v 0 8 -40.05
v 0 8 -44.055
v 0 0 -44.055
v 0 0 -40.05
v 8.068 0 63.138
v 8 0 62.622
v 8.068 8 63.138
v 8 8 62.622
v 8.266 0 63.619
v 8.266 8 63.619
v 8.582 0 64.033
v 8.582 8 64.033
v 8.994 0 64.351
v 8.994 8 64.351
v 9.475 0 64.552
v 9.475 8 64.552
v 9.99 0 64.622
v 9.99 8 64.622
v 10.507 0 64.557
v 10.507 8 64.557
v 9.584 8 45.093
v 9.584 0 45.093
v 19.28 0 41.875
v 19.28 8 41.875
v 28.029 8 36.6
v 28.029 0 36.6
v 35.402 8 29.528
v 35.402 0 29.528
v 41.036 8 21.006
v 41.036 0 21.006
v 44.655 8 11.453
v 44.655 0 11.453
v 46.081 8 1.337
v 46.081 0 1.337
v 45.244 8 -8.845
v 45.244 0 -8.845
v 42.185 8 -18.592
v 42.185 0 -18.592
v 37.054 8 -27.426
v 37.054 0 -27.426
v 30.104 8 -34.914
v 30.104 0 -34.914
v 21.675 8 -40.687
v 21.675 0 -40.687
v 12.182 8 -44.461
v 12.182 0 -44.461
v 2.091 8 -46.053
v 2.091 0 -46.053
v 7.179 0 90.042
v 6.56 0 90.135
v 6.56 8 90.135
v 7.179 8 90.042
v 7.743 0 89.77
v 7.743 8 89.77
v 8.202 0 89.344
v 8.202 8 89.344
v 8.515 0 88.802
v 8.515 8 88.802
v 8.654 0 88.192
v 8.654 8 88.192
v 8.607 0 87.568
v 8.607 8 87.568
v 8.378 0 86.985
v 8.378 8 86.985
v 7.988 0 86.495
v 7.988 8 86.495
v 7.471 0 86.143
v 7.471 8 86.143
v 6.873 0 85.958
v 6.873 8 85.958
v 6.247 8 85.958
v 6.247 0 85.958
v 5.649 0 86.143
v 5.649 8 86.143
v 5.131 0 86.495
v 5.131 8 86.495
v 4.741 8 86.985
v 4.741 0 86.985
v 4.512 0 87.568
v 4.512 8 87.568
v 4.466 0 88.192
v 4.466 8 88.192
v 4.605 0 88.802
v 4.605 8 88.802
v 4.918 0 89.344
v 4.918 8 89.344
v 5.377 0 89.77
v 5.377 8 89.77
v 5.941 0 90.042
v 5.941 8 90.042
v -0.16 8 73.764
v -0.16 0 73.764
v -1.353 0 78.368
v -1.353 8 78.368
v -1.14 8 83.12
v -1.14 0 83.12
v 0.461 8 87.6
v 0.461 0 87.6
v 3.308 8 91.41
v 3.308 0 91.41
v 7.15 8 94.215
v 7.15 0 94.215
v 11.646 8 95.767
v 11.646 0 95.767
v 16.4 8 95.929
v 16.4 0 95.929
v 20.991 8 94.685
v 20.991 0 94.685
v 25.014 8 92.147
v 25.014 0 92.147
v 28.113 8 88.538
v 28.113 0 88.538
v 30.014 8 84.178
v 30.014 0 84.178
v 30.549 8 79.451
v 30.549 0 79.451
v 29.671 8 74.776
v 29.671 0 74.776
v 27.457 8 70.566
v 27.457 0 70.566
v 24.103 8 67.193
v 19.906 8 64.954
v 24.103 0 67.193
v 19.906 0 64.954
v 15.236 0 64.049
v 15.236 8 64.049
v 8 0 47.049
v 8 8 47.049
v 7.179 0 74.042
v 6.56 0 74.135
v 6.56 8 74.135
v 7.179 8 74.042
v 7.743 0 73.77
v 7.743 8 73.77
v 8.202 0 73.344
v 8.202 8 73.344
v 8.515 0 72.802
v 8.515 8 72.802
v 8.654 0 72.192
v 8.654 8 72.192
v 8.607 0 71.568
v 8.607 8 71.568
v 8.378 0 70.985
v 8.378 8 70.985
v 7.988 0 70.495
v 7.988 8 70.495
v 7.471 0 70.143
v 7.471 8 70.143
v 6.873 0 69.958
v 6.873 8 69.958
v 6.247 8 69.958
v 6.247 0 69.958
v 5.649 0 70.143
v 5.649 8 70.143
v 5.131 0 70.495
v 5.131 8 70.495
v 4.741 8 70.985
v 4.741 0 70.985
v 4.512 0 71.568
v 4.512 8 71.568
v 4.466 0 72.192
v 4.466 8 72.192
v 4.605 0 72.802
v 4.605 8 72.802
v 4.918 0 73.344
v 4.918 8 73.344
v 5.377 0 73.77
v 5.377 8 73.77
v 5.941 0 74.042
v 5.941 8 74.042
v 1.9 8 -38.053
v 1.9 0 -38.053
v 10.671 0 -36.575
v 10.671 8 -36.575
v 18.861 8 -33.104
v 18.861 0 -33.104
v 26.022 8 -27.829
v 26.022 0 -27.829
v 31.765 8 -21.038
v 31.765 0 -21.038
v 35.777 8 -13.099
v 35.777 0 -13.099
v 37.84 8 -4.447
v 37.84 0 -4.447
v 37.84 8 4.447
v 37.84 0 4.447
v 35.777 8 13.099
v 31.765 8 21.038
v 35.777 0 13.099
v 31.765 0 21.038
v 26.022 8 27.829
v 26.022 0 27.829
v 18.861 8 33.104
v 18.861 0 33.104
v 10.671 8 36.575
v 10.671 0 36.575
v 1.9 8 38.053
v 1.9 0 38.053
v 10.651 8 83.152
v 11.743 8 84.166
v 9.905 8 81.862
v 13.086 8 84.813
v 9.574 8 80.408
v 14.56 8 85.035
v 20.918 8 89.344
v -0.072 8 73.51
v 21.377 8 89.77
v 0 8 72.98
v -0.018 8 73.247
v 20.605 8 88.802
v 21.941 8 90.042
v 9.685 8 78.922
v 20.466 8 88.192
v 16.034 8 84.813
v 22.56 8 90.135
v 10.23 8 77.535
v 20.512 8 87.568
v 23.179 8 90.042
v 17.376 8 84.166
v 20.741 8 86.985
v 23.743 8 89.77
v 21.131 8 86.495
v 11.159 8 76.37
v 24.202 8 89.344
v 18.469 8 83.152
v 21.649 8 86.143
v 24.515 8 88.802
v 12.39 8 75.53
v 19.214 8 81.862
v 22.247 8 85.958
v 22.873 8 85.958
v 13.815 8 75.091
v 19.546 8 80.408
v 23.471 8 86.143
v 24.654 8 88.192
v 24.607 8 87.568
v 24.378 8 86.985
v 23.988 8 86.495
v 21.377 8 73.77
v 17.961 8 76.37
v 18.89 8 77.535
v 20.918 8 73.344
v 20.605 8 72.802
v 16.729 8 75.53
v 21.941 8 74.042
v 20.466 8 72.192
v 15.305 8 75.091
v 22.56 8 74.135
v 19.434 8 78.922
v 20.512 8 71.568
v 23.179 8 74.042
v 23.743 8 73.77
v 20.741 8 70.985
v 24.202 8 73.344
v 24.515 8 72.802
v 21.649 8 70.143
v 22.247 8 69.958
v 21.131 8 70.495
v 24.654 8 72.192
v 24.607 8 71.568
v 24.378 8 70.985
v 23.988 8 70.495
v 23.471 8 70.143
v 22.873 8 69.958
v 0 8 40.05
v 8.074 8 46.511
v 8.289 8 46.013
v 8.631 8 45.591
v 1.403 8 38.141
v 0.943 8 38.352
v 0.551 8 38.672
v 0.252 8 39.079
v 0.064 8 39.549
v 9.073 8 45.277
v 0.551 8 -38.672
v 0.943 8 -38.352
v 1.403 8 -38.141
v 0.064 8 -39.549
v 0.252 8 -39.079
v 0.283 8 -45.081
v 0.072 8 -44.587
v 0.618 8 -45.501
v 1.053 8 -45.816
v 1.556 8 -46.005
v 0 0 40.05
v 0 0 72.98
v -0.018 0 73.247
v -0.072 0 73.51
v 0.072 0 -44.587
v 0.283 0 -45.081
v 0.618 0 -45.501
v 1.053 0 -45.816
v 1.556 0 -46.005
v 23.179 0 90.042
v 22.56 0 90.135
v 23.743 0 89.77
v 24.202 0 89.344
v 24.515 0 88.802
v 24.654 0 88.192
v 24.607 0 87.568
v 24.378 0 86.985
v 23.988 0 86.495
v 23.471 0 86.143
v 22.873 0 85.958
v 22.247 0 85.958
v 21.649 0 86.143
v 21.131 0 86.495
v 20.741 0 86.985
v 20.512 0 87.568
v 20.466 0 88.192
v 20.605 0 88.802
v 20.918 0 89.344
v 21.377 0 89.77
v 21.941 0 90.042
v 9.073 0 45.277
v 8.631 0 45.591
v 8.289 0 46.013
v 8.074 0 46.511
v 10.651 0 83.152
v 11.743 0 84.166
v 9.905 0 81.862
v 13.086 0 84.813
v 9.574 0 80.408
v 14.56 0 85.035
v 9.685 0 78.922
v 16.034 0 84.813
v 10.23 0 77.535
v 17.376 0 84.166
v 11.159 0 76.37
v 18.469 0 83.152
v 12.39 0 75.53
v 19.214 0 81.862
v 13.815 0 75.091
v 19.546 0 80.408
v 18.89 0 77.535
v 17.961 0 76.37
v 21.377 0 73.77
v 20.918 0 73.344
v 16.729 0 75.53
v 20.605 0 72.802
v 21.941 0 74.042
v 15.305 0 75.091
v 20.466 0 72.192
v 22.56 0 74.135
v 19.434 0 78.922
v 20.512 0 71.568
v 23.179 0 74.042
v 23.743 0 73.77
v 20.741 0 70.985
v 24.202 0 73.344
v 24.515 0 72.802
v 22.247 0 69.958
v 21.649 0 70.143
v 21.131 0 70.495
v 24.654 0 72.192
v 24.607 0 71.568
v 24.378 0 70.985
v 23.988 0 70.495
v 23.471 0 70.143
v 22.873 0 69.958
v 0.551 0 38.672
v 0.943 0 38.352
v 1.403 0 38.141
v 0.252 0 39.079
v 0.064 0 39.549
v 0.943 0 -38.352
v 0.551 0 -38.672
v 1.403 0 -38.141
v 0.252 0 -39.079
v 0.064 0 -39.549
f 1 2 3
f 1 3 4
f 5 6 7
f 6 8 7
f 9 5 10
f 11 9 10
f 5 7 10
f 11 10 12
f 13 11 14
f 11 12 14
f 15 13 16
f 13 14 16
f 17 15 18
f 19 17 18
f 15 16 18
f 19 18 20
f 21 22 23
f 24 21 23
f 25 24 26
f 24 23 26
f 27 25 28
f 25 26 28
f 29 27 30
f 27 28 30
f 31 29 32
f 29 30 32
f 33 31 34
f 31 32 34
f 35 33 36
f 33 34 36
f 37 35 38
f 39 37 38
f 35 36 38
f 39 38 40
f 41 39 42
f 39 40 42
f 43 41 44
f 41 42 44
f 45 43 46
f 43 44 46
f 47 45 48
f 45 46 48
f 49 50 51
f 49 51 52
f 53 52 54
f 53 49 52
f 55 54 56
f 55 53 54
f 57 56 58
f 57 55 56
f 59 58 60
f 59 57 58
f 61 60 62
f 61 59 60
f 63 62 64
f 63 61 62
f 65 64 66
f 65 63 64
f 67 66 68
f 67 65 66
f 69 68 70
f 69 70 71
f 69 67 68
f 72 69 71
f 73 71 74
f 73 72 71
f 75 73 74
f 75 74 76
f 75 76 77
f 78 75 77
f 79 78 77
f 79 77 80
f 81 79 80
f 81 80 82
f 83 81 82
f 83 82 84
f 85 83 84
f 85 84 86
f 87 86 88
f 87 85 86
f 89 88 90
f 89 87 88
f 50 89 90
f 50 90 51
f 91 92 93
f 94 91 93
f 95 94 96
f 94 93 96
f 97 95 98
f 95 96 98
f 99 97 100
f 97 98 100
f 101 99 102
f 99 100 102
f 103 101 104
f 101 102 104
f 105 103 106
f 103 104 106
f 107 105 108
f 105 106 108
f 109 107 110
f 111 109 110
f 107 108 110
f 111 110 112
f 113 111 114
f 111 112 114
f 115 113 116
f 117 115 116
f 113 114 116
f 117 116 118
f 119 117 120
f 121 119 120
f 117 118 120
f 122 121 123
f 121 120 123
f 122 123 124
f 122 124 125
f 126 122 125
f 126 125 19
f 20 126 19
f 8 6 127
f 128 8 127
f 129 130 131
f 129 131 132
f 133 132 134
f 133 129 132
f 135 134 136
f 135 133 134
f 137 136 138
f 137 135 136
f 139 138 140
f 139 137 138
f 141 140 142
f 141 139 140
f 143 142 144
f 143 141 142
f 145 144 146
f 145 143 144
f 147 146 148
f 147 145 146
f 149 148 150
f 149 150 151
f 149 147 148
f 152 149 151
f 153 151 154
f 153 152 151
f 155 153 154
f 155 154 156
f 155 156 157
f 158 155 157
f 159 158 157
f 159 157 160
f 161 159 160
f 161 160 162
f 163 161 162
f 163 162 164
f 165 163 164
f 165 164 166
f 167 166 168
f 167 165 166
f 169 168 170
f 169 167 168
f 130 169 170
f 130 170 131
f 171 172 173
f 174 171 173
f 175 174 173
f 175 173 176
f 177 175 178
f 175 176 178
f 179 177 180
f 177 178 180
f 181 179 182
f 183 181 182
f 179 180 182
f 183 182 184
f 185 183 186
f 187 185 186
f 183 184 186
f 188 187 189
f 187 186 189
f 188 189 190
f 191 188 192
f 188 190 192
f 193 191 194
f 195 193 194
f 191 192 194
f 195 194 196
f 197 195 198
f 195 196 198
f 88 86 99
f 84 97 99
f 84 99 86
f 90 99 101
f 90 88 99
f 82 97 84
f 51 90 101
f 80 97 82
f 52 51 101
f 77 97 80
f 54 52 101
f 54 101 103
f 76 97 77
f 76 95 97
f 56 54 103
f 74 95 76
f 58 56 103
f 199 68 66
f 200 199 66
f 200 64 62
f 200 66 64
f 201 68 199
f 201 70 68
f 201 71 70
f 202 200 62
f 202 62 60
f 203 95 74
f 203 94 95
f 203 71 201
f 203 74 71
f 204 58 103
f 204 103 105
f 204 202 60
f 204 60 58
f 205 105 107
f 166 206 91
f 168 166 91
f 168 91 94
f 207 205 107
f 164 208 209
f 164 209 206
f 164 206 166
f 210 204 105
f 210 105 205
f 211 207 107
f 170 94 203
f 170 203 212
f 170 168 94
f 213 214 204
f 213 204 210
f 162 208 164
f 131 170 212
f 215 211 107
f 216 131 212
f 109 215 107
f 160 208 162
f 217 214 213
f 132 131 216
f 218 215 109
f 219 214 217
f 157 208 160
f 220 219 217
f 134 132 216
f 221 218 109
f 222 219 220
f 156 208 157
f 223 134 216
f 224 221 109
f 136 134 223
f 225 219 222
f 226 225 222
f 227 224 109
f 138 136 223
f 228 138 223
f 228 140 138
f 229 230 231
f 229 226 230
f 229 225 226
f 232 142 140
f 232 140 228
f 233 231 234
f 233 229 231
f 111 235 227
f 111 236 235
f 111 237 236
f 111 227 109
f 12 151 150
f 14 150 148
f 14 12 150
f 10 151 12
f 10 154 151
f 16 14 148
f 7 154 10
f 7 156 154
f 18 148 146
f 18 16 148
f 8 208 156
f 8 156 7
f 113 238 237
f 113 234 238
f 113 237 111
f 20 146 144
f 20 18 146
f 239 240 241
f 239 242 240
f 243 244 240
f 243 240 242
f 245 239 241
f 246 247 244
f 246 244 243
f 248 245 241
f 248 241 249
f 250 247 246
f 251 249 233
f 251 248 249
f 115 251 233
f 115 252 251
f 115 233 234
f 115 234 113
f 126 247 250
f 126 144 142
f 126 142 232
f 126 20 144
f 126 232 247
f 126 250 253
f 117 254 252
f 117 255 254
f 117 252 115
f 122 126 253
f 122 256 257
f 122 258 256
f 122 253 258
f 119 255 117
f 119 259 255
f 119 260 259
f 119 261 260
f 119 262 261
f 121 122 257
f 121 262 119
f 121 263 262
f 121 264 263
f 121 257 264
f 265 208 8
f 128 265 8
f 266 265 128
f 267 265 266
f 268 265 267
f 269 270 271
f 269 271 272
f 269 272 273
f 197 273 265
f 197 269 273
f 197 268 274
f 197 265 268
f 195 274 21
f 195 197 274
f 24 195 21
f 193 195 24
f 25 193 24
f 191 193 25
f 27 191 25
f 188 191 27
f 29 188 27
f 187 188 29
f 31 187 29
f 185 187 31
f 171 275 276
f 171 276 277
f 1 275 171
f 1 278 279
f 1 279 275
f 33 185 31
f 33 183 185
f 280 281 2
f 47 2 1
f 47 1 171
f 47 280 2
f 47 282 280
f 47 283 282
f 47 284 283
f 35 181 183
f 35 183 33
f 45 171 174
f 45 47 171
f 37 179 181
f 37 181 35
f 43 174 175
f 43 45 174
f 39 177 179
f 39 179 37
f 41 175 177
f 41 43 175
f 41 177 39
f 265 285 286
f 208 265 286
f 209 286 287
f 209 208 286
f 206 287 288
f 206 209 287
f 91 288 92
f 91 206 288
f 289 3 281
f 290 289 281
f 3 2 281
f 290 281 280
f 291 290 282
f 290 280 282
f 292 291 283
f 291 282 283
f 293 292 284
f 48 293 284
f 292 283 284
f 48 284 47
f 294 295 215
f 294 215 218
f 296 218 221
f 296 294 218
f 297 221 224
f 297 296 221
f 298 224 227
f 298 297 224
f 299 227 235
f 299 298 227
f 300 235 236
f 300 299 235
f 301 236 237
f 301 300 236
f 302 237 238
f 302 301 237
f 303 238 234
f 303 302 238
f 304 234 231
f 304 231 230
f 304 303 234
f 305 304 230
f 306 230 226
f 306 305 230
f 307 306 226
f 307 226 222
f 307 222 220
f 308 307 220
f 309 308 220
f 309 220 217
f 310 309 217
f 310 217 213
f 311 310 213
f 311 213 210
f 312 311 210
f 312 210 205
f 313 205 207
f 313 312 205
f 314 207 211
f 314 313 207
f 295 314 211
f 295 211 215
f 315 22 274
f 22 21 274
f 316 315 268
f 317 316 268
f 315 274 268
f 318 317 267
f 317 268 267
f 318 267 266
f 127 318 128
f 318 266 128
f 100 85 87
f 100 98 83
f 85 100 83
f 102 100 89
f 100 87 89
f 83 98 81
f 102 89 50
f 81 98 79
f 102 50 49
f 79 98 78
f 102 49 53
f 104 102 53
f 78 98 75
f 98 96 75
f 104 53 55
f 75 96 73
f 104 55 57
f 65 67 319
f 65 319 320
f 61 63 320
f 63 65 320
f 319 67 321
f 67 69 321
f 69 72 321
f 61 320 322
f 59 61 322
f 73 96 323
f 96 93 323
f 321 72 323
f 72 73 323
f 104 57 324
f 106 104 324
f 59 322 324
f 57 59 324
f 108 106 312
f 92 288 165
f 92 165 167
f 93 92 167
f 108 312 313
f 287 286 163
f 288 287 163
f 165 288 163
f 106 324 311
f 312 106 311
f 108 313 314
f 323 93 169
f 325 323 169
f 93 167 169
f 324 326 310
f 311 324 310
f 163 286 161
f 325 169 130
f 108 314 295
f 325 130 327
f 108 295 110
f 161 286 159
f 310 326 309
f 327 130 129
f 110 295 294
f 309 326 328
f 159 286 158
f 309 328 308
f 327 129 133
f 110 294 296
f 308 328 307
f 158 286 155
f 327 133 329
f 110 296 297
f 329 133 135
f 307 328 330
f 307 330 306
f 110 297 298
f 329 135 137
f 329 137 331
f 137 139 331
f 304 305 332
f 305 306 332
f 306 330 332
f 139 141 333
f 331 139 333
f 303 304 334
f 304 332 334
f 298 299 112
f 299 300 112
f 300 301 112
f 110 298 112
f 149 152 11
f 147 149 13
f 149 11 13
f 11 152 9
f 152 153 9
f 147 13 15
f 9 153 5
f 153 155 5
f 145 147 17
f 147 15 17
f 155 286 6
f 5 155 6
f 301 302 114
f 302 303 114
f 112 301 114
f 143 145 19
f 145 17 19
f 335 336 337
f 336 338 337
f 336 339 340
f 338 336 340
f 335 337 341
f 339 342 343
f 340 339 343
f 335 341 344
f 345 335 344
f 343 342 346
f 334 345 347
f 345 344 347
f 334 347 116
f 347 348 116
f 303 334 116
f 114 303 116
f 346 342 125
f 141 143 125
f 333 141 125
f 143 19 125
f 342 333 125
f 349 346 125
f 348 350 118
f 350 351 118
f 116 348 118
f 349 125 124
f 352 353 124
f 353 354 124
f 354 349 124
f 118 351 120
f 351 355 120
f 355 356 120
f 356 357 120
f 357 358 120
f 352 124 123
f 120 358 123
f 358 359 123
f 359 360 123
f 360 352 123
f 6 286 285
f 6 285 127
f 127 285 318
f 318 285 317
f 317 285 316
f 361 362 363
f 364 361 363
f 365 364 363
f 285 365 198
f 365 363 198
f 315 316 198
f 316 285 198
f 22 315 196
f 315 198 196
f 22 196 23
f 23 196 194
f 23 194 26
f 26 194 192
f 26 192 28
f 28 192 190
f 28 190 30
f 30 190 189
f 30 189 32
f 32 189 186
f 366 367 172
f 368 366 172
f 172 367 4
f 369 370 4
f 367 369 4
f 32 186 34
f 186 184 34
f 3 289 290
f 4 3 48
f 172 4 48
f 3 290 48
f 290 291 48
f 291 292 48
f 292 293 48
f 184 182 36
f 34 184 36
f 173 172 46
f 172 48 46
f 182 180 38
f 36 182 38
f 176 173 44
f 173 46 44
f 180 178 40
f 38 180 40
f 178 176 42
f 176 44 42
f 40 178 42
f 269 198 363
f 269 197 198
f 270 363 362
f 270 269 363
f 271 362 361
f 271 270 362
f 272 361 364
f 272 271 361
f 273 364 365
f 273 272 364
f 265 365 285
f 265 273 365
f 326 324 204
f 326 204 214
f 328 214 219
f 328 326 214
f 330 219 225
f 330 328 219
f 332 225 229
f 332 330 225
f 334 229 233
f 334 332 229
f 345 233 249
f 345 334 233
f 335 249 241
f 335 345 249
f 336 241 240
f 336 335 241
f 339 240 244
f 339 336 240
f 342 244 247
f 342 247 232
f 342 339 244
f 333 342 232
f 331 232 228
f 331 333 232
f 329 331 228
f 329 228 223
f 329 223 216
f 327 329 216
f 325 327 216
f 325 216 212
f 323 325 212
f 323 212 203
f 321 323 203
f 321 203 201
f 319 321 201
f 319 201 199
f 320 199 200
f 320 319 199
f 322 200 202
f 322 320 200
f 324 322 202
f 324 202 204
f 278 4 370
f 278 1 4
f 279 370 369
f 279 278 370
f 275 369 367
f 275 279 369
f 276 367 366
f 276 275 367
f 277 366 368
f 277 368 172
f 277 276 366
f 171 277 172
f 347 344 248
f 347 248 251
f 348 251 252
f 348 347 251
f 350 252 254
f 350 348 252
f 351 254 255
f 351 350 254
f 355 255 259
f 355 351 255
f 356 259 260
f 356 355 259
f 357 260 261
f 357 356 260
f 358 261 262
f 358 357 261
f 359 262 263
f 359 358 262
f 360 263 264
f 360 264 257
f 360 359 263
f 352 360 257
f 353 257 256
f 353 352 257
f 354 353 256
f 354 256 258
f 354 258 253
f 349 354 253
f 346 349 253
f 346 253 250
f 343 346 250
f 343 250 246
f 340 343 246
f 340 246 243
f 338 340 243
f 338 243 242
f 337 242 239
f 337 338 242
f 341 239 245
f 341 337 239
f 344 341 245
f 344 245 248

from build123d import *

# Parameters (mm, degrees)
SKETCH1_R           = 2.1
SKETCH1_R_2         = 5
BOSS_EXTRUDE2_DEPTH = 8
FILLET1_R           = 2


with BuildPart() as part:
    # Sketch1 → Boss-Extrude2 (new body)
    with BuildSketch(Plane(origin=(0, 0, 0), x_dir=(1, 0, 0), z_dir=(0, 1, 0))):
        with BuildLine():
            Line((0, 46.1), (0, 38.1))
            ThreePointArc((0, 38.1), (38.1, 0), (0, -38.1))
            Line((0, -38.1), (0, -73.400550657))
            ThreePointArc((0, -73.400550657), (25.844530788, -91.377376201), (8, -65.441325051))
            Line((8, -65.441325051), (8, -45.400550657))
            ThreePointArc((8, -45.400550657), (45.924804764, 4.015259312), (0, 46.1))
        make_face()
        with Locations(Location((22.559764633, -72.034799208, 0), (0, 0, 270))):
            Circle(SKETCH1_R, mode=Mode.SUBTRACT)
        with Locations(Location((22.559764633, -88.034799208, 0), (0, 0, 270))):
            Circle(SKETCH1_R, mode=Mode.SUBTRACT)
        with Locations(Location((6.559764633, -88.034799208, 0), (0, 0, 270))):
            Circle(SKETCH1_R, mode=Mode.SUBTRACT)
        with Locations(Location((6.559764633, -72.034799208, 0), (0, 0, 270))):
            Circle(SKETCH1_R, mode=Mode.SUBTRACT)
        with Locations(Location((14.559764633, -80.034799208, 0), (0, 0, 270))):
            Circle(SKETCH1_R_2, mode=Mode.SUBTRACT)
    extrude(amount=BOSS_EXTRUDE2_DEPTH)

    # Fillet1
    fillet1_edges = [part.edges().sort_by_distance(p)[0] for p in [
        (0, 4, 38.1),
        (0, 4, -38.1),
        (0, 4, -46.1),
        (8, 4, 45.400550657),
        (8, 4, 65.441325051),
        (0, 4, 73.400550657),
    ]]
    fillet(fillet1_edges, radius=FILLET1_R)


solid = part.part
